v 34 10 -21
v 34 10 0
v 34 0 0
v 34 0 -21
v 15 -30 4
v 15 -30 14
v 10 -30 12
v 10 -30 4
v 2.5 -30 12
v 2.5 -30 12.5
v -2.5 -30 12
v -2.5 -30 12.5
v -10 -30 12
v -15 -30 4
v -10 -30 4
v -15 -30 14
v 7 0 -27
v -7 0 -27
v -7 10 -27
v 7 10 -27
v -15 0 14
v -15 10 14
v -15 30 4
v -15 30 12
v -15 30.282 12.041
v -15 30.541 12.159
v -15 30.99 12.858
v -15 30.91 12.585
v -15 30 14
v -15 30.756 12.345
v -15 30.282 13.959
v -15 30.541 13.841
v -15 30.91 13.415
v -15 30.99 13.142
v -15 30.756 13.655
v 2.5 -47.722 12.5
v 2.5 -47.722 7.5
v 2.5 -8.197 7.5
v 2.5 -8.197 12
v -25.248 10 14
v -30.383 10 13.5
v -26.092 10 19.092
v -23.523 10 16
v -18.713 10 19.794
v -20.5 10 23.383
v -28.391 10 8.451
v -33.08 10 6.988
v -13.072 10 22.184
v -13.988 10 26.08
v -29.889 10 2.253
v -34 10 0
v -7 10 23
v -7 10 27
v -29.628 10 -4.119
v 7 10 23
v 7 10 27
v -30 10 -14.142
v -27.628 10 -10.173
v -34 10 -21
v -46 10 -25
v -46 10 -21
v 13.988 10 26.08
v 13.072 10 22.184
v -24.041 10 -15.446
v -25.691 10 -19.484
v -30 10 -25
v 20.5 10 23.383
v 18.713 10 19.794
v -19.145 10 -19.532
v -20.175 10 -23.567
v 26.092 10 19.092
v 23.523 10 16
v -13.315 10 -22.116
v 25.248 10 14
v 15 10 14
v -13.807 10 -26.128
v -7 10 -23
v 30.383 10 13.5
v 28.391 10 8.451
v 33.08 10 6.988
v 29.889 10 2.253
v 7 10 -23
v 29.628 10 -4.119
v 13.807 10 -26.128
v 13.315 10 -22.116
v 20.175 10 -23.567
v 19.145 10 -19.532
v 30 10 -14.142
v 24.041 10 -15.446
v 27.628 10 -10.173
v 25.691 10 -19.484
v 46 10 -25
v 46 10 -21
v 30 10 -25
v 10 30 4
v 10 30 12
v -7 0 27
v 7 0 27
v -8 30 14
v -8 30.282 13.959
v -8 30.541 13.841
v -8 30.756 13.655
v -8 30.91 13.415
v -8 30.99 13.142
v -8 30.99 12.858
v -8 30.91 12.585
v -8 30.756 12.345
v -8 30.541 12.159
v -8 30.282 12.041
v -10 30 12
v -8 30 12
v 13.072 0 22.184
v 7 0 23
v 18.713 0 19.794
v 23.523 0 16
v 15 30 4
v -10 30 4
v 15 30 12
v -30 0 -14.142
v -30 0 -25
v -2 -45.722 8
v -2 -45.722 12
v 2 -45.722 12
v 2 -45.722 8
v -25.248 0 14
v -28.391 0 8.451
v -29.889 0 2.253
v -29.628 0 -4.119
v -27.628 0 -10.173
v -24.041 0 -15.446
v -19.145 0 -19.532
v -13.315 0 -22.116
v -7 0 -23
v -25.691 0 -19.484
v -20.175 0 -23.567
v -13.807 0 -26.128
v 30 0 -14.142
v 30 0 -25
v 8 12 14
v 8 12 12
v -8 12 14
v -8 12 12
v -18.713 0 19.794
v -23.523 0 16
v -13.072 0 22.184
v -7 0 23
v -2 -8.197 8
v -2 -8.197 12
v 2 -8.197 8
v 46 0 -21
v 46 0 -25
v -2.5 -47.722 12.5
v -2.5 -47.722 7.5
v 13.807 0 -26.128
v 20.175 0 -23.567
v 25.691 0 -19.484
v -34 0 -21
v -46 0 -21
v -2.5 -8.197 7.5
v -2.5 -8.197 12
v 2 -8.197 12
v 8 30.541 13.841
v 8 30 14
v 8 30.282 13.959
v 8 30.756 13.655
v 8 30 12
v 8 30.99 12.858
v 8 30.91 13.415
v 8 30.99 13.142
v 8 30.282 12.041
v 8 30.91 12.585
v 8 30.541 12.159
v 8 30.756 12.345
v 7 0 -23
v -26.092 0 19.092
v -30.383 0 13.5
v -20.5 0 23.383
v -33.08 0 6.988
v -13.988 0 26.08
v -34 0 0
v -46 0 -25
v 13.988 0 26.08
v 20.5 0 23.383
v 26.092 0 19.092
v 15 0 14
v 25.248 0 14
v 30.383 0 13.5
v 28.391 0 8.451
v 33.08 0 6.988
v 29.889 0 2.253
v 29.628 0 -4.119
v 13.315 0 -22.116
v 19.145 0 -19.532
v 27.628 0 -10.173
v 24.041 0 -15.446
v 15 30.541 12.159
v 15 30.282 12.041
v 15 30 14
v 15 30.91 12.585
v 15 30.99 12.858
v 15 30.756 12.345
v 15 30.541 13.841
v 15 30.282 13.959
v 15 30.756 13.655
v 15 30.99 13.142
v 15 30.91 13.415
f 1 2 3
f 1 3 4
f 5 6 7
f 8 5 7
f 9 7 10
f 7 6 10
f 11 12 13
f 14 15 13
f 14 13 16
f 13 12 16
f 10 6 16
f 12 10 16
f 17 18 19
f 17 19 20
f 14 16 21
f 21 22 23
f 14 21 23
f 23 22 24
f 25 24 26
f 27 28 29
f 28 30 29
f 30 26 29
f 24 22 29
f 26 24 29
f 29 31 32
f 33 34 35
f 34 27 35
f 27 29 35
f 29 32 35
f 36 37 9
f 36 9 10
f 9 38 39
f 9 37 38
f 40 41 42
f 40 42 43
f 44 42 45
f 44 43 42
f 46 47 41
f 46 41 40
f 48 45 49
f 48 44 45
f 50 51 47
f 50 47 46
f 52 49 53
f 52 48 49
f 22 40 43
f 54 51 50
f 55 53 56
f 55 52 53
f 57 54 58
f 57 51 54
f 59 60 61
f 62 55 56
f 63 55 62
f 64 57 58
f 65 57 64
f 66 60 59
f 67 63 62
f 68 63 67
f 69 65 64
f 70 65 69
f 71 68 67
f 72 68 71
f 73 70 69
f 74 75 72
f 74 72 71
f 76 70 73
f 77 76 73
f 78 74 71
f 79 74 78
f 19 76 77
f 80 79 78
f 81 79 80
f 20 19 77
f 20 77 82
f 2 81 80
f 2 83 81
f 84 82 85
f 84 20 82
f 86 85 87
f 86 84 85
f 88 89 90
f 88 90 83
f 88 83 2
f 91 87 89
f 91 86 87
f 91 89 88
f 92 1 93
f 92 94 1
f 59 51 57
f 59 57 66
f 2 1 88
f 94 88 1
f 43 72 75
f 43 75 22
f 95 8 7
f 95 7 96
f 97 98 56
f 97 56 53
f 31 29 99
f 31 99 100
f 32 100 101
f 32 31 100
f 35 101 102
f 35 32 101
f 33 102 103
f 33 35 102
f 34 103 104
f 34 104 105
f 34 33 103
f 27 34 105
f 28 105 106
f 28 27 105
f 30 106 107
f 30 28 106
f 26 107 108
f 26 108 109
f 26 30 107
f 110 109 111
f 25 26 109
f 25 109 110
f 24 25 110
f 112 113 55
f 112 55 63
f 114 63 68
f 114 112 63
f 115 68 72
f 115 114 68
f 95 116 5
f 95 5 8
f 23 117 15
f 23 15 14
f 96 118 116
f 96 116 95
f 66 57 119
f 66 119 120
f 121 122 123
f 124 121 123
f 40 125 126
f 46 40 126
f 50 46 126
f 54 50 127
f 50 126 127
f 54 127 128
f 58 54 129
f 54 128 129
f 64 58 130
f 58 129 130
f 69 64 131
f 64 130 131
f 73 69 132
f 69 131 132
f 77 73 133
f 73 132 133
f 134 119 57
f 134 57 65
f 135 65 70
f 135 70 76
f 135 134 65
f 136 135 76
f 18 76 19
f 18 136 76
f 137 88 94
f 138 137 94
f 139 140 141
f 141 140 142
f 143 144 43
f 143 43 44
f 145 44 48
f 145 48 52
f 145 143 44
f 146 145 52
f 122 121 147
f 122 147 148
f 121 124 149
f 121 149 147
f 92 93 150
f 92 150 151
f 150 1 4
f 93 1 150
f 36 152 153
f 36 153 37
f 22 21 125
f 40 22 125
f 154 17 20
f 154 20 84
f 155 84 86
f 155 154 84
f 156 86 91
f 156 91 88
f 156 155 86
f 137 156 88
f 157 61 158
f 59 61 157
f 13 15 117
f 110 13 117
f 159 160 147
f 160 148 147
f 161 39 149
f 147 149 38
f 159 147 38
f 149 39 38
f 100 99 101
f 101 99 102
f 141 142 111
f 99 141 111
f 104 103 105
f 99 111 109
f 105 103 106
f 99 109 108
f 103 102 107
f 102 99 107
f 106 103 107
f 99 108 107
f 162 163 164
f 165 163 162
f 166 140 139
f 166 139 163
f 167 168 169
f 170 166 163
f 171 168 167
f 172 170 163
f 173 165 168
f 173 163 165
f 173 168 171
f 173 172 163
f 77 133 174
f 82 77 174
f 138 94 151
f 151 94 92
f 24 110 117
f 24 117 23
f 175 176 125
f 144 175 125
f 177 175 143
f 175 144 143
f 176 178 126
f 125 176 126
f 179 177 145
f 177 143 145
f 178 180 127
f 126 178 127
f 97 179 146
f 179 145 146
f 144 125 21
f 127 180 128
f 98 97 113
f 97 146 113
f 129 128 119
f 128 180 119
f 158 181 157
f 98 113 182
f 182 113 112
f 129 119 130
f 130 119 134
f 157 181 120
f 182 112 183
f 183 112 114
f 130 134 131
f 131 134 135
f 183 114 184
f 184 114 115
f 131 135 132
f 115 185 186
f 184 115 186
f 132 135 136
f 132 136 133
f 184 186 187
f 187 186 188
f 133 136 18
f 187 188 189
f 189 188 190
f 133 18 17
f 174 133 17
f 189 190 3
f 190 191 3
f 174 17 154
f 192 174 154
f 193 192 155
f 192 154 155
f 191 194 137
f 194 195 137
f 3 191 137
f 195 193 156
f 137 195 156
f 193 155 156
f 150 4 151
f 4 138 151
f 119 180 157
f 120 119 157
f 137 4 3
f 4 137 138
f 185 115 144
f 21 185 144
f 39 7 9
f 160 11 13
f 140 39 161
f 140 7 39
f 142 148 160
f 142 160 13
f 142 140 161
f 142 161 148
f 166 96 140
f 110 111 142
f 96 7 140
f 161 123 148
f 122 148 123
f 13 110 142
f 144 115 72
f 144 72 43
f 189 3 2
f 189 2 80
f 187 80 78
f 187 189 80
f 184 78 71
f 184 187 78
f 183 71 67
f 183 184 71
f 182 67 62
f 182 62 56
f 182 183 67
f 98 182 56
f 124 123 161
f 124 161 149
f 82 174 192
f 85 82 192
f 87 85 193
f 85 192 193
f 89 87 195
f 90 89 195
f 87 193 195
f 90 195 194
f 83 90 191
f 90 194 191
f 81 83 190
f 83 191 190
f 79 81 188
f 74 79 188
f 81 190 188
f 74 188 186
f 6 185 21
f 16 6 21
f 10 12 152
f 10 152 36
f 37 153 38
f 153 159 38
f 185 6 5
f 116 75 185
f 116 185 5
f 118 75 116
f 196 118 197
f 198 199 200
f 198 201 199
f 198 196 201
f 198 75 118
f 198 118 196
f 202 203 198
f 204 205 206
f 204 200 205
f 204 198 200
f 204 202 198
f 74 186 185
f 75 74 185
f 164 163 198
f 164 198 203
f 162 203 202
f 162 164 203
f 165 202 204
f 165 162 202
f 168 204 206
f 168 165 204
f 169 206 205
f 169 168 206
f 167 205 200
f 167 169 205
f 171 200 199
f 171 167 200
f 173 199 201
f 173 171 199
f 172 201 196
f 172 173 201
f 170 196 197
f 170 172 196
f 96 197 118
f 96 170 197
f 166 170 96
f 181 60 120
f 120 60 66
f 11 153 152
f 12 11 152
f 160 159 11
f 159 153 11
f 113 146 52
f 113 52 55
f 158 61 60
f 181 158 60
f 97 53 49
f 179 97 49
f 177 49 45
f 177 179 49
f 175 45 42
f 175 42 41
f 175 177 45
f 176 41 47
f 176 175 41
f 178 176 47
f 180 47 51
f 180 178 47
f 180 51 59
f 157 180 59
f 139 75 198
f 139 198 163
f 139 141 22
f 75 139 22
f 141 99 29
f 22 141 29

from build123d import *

# Parameters (mm, degrees)
EXTRUDE_1_DEPTH     = 10
SKETCH_3_W          = 30
SKETCH_3_H          = 60
EXTRUDE_2_DEPTH     = 10
SKETCH_7_R          = 1
EXTRUDE_4_DEPTH     = 30
SKETCH_6_W          = 16
SKETCH_6_H          = 49.282767792
CUT_EXTRUDE_2_DEPTH = 24
SKETCH_8_W          = 20
SKETCH_8_H          = 68.65426033
CUT_EXTRUDE_3_DEPTH = 8
SKETCH_10_W         = 4
SKETCH_10_H         = 4
SKETCH_16_W         = 5
SKETCH_16_H         = 5
EXTRUDE_5_DEPTH     = 2
SKETCH_17_W         = 4
SKETCH_17_H         = 25
EXTRUDE_6_DEPTH     = 10
SKETCH_18_W         = 12
SKETCH_18_H         = 4
EXTRUDE_7_DEPTH     = 10


with BuildPart() as part:
    # 草图2 → 凸台-拉伸1 (new body)
    with BuildSketch(Plane(origin=(0, 0, 0), x_dir=(1, 0, 0), z_dir=(0, 1, 0))):
        with BuildLine():
            Line((-7, 27), (7, 27))
            ThreePointArc((7, 27), (34, 0), (7, -27))
            Line((7, -27), (-7, -27))
            ThreePointArc((-7, -27), (-34, 0), (-7, 27))
        make_face()
        with BuildLine():
            Line((-7, 23), (7, 23))
            ThreePointArc((7, 23), (27.627651345, 10.173494975), (25.248287591, -14))
            Line((25.248287591, -14), (-25.248287591, -14))
            ThreePointArc((-25.248287591, -14), (-27.627651345, 10.173494975), (-7, 23))
        make_face(mode=Mode.SUBTRACT)
        with BuildLine():
            Line((-7, -23), (7, -23))
            ThreePointArc((7, -23), (15.972179222, -21.177818585), (23.522711642, -16))
            Line((23.522711642, -16), (-23.522711642, -16))
            ThreePointArc((-23.522711642, -16), (-15.972179222, -21.177818585), (-7, -23))
        make_face(mode=Mode.SUBTRACT)
    extrude(amount=EXTRUDE_1_DEPTH)

    # 草图3 → 凸台-拉伸2 (add)
    with BuildSketch(Plane(origin=(0, 0, 14), x_dir=(-1, 0, 0), z_dir=(0, 0, -1))):
        Rectangle(SKETCH_3_W, SKETCH_3_H)
    extrude(amount=EXTRUDE_2_DEPTH)

    # 草图7 → 凸台-拉伸4 (add)
    with BuildSketch(Plane.ZY.offset(15)):
        with Locations((13, 30)):
            Circle(SKETCH_7_R)
    extrude(amount=-EXTRUDE_4_DEPTH)

    # 草图6 → 切除-拉伸2 (cut, through all)
    with BuildSketch(Plane(origin=(0, 0, 4), x_dir=(-1, 0, 0), z_dir=(0, 0, -1))):
        with Locations((0, 36.641383896)):
            Rectangle(SKETCH_6_W, SKETCH_6_H)
    extrude(amount=-CUT_EXTRUDE_2_DEPTH, mode=Mode.SUBTRACT)

    # 草图8 → 切除-拉伸3 (cut)
    with BuildSketch(Plane(origin=(0, 0, 4), x_dir=(-1, 0, 0), z_dir=(0, 0, -1))):
        with Locations((0, -1.849037214)):
            Rectangle(SKETCH_8_W, SKETCH_8_H)
    extrude(amount=-CUT_EXTRUDE_3_DEPTH, mode=Mode.SUBTRACT)

    # 扫描2: sweep along a path in 草图12
    with BuildLine(Plane(origin=(0, 0, 12), x_dir=(-1, 0, 0), z_dir=(0, 0, -1))) as sweep_2_path:
        Line((-2.5, -8.196811454), (-2.5, -45.72167139))
    # 草图10 → 扫描2 (sweep)
    with BuildSketch(Plane.XZ.offset(30)):
        Polygon((-2.5, 12), (-2.5, 7.5), (2.5, 7.5), (2.5, 12), (2.5, 12.5), (-2.5, 12.5), align=None)
        with Locations((0, 10)):
            Rectangle(SKETCH_10_W, SKETCH_10_H, mode=Mode.SUBTRACT)
    sweep(path=sweep_2_path.line)

    # 草图16 → 凸台-拉伸5 (add)
    with BuildSketch(Plane.XZ.offset(45.72167139)):
        with Locations((0, 10)):
            Rectangle(SKETCH_16_W, SKETCH_16_H)
    extrude(amount=EXTRUDE_5_DEPTH)

    # 草图17 → 凸台-拉伸6 (add)
    with BuildSketch(Plane(origin=(0, 10, 0), x_dir=(1, 0, 0), z_dir=(0, 1, 0))):
        with Locations((-32, 12.5)):
            Rectangle(SKETCH_17_W, SKETCH_17_H)
        with Locations((32, 12.5)):
            Rectangle(SKETCH_17_W, SKETCH_17_H)
    extrude(amount=-EXTRUDE_6_DEPTH)

    # 草图18 → 凸台-拉伸7 (add)
    with BuildSketch(Plane(origin=(0, 10, 0), x_dir=(1, 0, 0), z_dir=(0, 1, 0))):
        with Locations((-40, 23)):
            Rectangle(SKETCH_18_W, SKETCH_18_H)
        with Locations((40, 23)):
            Rectangle(SKETCH_18_W, SKETCH_18_H)
    extrude(amount=-EXTRUDE_7_DEPTH)


solid = part.part
